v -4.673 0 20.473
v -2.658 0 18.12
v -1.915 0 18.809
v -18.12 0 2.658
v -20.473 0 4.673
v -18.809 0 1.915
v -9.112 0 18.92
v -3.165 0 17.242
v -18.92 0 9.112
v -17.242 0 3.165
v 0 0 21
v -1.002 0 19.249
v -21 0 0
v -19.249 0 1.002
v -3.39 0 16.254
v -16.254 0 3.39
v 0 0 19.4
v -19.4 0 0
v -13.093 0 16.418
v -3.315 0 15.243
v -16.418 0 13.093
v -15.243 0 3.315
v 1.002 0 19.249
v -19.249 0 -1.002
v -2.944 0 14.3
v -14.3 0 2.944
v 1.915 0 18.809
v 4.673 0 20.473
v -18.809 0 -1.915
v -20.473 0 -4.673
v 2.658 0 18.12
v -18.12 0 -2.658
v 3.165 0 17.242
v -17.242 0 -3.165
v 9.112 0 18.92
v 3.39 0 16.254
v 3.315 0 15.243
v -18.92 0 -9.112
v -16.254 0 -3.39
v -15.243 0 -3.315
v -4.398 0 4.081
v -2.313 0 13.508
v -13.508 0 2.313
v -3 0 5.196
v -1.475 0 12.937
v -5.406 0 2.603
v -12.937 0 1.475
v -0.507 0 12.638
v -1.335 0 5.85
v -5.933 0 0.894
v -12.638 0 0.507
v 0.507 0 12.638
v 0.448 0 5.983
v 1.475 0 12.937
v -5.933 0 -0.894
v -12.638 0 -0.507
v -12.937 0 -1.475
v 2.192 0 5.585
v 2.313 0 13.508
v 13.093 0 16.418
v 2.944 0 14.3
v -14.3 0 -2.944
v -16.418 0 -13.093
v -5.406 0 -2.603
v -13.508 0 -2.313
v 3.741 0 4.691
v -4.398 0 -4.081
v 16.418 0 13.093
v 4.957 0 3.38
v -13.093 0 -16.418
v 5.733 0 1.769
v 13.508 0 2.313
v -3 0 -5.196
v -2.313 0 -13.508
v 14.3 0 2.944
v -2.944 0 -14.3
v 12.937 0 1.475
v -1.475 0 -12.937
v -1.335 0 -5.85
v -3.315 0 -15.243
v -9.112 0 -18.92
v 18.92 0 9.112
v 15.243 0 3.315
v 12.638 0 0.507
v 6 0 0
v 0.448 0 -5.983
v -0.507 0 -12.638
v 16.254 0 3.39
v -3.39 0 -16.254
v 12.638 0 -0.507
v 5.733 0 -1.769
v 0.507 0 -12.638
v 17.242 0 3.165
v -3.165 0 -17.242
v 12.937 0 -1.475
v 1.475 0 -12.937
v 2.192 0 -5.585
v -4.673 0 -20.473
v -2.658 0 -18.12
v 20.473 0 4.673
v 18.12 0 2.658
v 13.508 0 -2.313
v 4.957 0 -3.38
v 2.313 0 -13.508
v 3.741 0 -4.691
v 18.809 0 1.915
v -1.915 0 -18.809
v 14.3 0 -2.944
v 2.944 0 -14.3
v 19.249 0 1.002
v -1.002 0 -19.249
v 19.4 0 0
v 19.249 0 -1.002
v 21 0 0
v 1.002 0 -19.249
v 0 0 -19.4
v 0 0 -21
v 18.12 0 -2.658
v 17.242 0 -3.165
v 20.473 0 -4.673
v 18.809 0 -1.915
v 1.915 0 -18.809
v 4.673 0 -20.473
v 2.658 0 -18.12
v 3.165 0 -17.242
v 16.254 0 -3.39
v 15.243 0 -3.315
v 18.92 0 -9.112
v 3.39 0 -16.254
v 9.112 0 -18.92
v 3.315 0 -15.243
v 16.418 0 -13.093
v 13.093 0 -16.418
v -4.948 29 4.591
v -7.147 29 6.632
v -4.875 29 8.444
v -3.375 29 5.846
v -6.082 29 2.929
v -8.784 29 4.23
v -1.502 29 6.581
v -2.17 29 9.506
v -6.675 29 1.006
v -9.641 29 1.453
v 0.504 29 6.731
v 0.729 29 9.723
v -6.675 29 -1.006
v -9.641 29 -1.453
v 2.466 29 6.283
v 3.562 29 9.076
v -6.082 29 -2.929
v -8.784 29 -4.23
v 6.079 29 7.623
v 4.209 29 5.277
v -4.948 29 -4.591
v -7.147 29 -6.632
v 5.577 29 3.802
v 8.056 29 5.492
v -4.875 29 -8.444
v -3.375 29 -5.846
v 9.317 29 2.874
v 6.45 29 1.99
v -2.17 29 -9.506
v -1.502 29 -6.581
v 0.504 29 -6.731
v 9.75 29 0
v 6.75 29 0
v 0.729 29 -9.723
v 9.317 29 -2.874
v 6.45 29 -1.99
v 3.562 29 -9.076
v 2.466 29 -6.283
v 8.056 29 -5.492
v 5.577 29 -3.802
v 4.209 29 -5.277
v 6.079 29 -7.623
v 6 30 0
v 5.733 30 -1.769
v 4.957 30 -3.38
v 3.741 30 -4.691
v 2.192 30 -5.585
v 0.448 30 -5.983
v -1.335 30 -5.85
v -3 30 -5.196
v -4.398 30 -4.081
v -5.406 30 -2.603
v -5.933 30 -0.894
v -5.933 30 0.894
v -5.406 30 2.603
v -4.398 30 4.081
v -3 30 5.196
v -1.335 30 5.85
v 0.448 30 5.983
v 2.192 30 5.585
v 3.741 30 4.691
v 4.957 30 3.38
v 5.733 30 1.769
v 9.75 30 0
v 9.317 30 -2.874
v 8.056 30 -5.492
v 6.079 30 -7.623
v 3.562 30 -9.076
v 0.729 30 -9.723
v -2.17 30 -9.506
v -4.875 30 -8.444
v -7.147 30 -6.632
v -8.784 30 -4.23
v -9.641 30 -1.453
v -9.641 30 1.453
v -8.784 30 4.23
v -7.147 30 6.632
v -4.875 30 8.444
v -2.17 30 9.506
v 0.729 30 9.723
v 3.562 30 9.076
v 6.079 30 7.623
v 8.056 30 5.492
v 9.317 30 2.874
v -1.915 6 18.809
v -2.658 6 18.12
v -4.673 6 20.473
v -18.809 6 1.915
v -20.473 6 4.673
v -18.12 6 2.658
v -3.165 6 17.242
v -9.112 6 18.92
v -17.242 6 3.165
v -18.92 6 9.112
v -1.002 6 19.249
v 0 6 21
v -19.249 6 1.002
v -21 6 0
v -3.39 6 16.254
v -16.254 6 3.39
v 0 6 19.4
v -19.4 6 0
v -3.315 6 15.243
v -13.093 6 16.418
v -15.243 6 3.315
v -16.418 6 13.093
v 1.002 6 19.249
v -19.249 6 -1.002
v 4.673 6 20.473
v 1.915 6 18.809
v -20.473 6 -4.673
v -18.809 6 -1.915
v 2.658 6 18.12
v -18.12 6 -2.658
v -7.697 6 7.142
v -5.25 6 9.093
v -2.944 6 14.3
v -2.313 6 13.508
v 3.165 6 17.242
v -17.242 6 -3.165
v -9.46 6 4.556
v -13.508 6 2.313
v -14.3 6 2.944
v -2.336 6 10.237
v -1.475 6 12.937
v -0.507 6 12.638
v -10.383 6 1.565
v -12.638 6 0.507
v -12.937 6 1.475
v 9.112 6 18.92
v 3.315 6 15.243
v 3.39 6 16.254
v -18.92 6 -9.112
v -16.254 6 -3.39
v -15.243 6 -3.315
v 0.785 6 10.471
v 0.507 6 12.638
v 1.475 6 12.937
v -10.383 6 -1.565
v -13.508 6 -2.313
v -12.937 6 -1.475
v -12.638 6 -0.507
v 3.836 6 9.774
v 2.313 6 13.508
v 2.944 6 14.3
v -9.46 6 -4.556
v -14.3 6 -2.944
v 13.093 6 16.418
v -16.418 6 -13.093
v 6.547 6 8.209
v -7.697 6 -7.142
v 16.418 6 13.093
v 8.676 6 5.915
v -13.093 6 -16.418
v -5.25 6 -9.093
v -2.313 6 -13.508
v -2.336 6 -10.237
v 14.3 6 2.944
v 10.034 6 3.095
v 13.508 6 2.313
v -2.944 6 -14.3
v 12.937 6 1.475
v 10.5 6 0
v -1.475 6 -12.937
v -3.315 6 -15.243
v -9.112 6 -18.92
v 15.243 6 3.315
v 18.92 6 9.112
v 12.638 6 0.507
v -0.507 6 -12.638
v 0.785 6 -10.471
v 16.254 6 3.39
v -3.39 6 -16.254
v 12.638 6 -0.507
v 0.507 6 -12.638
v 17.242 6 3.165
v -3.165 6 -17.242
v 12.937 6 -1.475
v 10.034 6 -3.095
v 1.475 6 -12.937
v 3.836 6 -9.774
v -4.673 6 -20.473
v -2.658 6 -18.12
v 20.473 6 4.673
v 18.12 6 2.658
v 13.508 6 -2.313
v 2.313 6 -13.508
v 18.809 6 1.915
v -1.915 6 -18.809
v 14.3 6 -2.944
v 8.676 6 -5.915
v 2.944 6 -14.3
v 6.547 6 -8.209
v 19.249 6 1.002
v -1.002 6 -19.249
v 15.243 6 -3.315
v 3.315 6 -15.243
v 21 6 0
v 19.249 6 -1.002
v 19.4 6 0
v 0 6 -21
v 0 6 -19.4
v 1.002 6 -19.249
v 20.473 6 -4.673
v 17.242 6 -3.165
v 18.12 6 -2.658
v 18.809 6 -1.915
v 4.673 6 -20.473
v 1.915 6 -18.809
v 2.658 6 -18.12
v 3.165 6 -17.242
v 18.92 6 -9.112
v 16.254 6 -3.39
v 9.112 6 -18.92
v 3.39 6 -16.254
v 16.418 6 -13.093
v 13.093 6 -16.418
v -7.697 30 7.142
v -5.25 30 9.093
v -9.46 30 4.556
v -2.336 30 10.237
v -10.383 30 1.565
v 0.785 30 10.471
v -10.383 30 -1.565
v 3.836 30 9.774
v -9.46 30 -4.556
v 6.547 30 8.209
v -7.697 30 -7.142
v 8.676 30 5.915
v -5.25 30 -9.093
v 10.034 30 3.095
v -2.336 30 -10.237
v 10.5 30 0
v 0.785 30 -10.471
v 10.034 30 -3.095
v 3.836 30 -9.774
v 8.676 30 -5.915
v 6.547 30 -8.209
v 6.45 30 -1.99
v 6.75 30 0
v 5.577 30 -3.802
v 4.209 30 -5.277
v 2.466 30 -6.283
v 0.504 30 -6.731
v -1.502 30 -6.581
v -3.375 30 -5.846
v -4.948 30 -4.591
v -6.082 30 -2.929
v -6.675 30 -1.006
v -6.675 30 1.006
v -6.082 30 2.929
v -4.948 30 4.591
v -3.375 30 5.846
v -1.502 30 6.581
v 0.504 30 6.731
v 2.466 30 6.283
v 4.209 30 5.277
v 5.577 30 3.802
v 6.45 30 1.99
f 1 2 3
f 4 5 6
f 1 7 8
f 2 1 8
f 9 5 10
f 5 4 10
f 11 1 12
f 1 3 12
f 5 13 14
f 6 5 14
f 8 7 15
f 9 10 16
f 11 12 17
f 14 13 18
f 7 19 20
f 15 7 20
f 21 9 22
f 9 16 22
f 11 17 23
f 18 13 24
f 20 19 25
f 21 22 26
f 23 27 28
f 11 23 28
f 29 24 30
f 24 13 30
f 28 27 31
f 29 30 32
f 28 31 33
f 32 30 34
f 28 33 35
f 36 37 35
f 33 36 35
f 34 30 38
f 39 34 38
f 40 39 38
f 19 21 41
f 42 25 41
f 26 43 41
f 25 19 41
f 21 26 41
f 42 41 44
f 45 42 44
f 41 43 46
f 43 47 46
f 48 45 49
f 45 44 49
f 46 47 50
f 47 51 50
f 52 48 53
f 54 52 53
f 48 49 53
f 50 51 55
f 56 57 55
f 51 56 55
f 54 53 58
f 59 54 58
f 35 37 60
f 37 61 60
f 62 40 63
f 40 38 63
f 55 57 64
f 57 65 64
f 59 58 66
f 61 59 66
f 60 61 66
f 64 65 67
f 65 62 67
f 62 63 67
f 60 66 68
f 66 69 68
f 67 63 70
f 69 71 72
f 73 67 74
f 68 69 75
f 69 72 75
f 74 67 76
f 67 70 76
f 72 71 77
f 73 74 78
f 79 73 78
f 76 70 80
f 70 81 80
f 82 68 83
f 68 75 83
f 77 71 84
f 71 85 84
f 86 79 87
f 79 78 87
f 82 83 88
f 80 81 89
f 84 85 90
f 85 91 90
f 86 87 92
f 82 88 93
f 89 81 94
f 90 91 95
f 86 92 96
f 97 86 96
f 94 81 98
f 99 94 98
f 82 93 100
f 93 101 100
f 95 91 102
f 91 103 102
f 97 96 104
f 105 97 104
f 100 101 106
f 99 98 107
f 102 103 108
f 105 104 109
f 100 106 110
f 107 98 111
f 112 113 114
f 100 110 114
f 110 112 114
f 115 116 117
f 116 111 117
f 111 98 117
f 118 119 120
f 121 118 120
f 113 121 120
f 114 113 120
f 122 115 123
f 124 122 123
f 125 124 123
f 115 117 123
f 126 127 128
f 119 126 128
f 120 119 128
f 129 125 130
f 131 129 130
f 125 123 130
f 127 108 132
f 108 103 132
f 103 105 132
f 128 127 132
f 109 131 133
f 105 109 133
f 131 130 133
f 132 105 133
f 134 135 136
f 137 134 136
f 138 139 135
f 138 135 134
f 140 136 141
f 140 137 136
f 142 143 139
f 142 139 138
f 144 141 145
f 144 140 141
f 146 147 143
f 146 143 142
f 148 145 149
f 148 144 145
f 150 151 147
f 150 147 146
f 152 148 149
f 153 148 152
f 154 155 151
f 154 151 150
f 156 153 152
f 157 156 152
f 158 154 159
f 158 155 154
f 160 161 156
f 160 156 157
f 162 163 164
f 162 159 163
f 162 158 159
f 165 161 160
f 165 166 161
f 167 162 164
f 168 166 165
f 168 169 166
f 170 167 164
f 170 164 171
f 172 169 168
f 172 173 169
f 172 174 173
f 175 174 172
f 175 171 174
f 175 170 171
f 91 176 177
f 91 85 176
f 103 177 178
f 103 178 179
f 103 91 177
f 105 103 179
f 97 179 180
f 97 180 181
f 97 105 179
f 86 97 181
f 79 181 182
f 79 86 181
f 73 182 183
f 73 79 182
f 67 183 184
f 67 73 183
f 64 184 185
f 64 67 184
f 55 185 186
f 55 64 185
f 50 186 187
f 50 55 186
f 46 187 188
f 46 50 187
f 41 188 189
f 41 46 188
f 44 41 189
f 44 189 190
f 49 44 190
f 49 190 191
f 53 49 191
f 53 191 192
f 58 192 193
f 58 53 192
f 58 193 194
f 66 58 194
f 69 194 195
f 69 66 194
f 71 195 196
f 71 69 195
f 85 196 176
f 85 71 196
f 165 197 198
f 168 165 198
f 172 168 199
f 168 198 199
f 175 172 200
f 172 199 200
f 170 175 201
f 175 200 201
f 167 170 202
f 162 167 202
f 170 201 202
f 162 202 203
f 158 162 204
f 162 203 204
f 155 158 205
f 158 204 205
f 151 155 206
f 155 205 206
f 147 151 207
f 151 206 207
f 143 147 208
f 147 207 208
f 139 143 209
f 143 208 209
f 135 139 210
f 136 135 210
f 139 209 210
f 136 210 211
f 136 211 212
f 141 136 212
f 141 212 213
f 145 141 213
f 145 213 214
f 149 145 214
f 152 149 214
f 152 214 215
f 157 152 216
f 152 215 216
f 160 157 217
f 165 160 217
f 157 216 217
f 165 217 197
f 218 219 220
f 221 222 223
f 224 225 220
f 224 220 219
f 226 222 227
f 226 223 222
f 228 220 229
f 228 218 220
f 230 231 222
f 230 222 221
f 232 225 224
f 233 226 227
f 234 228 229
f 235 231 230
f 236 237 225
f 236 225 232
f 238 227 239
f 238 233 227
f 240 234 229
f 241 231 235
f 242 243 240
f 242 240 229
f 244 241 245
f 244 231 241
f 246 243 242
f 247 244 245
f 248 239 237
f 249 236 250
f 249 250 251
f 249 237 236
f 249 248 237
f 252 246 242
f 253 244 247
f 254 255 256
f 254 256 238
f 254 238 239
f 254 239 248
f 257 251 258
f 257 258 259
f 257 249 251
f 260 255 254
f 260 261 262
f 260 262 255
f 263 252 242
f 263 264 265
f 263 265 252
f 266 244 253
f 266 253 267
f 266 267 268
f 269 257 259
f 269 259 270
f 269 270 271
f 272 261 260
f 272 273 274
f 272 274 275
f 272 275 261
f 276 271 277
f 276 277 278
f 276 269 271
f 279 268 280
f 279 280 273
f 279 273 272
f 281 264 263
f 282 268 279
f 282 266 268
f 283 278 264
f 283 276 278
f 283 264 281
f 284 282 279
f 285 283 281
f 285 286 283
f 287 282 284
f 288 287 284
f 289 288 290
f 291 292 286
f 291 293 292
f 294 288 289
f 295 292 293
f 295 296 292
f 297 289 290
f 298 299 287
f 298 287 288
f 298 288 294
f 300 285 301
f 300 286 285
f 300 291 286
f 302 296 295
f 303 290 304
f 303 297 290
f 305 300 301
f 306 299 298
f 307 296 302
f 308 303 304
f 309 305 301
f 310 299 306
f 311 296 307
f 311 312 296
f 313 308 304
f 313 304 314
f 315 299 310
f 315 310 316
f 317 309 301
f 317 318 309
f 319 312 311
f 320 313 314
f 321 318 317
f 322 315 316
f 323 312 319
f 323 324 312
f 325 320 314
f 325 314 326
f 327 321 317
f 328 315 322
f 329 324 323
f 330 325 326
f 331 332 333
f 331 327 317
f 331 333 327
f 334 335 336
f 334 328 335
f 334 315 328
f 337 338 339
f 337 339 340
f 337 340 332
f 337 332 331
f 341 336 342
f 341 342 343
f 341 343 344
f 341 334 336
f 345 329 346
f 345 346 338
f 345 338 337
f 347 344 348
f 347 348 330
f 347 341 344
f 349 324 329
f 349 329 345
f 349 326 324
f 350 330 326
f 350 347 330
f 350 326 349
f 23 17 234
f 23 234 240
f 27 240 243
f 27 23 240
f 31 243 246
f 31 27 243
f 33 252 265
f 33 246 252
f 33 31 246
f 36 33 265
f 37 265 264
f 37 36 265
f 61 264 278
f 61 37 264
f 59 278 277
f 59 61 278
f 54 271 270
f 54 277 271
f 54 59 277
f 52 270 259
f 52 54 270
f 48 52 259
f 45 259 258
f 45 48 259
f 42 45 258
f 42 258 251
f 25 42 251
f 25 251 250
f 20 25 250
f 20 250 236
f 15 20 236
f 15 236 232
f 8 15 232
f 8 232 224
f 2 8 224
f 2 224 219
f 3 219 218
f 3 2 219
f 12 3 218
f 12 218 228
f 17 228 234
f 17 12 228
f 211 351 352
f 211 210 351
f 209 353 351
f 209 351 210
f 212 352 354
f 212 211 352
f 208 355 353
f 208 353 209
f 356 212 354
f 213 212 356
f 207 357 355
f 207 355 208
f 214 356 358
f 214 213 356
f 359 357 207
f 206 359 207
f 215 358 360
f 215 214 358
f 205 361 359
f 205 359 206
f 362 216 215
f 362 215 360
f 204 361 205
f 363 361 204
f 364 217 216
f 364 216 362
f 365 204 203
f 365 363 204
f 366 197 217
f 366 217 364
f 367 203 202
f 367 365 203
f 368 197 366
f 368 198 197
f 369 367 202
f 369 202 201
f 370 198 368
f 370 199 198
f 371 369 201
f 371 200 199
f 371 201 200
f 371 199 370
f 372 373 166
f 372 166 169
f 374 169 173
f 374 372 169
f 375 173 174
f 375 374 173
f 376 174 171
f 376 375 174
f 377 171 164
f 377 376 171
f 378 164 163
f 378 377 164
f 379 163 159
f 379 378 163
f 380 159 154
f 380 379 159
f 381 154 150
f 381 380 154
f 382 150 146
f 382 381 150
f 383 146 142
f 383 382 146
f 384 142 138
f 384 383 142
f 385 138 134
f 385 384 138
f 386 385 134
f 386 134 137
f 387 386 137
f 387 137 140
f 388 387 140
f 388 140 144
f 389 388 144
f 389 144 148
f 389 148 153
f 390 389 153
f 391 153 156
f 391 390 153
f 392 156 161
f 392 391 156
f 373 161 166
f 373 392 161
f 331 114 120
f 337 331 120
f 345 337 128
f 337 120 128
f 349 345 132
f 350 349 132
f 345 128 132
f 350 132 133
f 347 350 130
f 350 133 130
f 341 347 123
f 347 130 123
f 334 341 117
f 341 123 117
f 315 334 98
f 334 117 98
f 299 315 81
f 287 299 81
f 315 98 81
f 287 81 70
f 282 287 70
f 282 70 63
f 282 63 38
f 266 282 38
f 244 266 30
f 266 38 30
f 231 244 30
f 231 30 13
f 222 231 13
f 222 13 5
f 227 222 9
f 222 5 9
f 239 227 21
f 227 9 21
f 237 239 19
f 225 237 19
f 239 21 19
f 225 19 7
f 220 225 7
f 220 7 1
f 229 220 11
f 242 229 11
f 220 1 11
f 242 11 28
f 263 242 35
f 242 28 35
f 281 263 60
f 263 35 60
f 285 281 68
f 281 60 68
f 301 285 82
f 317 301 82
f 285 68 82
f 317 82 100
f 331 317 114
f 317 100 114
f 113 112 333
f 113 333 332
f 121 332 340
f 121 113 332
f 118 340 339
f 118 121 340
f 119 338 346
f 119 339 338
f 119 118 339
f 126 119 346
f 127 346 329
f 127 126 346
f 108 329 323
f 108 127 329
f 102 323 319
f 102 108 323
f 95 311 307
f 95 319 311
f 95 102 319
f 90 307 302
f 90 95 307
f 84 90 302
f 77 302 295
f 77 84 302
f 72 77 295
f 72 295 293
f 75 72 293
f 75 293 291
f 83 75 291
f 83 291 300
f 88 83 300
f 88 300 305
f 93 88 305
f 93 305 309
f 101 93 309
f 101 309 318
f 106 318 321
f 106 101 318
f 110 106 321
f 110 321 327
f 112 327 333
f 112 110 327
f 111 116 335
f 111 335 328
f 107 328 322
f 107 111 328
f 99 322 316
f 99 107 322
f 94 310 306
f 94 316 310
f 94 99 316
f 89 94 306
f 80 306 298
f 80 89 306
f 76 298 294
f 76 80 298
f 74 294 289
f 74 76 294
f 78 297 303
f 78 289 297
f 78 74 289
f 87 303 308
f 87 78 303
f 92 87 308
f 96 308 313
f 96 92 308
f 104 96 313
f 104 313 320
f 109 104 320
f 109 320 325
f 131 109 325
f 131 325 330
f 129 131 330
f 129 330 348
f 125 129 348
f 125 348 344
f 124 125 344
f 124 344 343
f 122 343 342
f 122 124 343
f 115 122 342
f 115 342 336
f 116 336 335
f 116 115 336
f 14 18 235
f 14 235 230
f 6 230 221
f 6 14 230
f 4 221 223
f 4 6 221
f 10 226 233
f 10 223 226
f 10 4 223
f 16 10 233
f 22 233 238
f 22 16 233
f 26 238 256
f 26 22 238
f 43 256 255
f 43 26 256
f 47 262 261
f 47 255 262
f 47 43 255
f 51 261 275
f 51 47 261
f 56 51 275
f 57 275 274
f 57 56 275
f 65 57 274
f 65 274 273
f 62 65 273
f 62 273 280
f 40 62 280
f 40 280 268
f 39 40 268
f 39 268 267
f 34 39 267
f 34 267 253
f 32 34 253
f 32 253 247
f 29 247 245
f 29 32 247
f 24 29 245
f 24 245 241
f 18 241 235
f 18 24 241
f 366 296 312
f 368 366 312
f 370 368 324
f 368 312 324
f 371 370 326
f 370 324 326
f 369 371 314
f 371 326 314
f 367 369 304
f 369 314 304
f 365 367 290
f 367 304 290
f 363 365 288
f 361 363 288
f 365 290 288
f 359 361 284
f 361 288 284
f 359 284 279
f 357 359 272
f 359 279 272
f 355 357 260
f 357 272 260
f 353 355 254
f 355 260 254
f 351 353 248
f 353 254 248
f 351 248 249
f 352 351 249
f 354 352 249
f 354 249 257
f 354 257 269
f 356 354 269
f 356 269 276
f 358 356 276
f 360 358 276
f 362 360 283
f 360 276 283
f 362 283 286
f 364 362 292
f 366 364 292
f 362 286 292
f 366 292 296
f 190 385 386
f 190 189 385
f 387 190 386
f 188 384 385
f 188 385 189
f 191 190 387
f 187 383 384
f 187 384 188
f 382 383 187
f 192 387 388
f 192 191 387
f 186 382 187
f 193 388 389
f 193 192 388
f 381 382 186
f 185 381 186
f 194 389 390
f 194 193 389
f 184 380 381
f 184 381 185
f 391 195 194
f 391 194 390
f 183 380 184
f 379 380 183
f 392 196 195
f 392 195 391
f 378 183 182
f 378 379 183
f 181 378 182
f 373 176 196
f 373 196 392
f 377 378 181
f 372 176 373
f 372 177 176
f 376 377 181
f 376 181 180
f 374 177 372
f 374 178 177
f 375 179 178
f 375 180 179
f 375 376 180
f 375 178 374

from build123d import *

# Parameters (mm, degrees)
SKETCH1_R           = 21
SKETCH1_R_2         = 6
BOSS_EXTRUDE1_DEPTH = 6
SKETCH2_R           = 10.5
SKETCH2_R_2         = 6
BOSS_EXTRUDE2_DEPTH = 24
SKETCH3_R           = 9.75
SKETCH3_R_2         = 6.75
CUT_EXTRUDE1_DEPTH  = 1
CUT_EXTRUDE2_START  = -7
SKETCH4_R           = 3.4
CUT_EXTRUDE2_DEPTH  = 32
CIRPATTERN1_COUNT   = 4


with BuildPart() as part:
    # Sketch1 → Boss-Extrude1 (new body)
    with BuildSketch(Plane(origin=(0, 0, 0), x_dir=(1, 0, 0), z_dir=(0, 1, 0))):
        Circle(SKETCH1_R)
        Circle(SKETCH1_R_2, mode=Mode.SUBTRACT)
    extrude(amount=BOSS_EXTRUDE1_DEPTH)

    # Sketch2 → Boss-Extrude2 (add)
    with BuildSketch(Plane(origin=(0, 6, 0), x_dir=(1, 0, 0), z_dir=(0, 1, 0))):
        Circle(SKETCH2_R)
        Circle(SKETCH2_R_2, mode=Mode.SUBTRACT)
    extrude(amount=BOSS_EXTRUDE2_DEPTH)

    # Sketch3 → Cut-Extrude1 (cut)
    with BuildSketch(Plane(origin=(0, 30, 0), x_dir=(1, 0, 0), z_dir=(0, 1, 0))):
        Circle(SKETCH3_R)
        Circle(SKETCH3_R_2, mode=Mode.SUBTRACT)
    extrude(amount=-CUT_EXTRUDE1_DEPTH, mode=Mode.SUBTRACT)

    # Sketch4 → Cut-Extrude2 (cut)
    with BuildSketch(Plane(origin=(0, 6, 0), x_dir=(1, 0, 0), z_dir=(0, 1, 0)).offset(CUT_EXTRUDE2_START)):
        with Locations((16, 0)):
            Circle(SKETCH4_R)
    cut_extrude2 = extrude(amount=CUT_EXTRUDE2_DEPTH, mode=Mode.SUBTRACT)

    # CirPattern1: Cut-Extrude2 ×4 about axis
    cirpattern1_axis = Axis((0, 0, 0), (0, 1, 0))
    for i in range(1, CIRPATTERN1_COUNT):
        add(cut_extrude2.rotate(cirpattern1_axis, i * 360 / CIRPATTERN1_COUNT), mode=Mode.SUBTRACT)


solid = part.part
